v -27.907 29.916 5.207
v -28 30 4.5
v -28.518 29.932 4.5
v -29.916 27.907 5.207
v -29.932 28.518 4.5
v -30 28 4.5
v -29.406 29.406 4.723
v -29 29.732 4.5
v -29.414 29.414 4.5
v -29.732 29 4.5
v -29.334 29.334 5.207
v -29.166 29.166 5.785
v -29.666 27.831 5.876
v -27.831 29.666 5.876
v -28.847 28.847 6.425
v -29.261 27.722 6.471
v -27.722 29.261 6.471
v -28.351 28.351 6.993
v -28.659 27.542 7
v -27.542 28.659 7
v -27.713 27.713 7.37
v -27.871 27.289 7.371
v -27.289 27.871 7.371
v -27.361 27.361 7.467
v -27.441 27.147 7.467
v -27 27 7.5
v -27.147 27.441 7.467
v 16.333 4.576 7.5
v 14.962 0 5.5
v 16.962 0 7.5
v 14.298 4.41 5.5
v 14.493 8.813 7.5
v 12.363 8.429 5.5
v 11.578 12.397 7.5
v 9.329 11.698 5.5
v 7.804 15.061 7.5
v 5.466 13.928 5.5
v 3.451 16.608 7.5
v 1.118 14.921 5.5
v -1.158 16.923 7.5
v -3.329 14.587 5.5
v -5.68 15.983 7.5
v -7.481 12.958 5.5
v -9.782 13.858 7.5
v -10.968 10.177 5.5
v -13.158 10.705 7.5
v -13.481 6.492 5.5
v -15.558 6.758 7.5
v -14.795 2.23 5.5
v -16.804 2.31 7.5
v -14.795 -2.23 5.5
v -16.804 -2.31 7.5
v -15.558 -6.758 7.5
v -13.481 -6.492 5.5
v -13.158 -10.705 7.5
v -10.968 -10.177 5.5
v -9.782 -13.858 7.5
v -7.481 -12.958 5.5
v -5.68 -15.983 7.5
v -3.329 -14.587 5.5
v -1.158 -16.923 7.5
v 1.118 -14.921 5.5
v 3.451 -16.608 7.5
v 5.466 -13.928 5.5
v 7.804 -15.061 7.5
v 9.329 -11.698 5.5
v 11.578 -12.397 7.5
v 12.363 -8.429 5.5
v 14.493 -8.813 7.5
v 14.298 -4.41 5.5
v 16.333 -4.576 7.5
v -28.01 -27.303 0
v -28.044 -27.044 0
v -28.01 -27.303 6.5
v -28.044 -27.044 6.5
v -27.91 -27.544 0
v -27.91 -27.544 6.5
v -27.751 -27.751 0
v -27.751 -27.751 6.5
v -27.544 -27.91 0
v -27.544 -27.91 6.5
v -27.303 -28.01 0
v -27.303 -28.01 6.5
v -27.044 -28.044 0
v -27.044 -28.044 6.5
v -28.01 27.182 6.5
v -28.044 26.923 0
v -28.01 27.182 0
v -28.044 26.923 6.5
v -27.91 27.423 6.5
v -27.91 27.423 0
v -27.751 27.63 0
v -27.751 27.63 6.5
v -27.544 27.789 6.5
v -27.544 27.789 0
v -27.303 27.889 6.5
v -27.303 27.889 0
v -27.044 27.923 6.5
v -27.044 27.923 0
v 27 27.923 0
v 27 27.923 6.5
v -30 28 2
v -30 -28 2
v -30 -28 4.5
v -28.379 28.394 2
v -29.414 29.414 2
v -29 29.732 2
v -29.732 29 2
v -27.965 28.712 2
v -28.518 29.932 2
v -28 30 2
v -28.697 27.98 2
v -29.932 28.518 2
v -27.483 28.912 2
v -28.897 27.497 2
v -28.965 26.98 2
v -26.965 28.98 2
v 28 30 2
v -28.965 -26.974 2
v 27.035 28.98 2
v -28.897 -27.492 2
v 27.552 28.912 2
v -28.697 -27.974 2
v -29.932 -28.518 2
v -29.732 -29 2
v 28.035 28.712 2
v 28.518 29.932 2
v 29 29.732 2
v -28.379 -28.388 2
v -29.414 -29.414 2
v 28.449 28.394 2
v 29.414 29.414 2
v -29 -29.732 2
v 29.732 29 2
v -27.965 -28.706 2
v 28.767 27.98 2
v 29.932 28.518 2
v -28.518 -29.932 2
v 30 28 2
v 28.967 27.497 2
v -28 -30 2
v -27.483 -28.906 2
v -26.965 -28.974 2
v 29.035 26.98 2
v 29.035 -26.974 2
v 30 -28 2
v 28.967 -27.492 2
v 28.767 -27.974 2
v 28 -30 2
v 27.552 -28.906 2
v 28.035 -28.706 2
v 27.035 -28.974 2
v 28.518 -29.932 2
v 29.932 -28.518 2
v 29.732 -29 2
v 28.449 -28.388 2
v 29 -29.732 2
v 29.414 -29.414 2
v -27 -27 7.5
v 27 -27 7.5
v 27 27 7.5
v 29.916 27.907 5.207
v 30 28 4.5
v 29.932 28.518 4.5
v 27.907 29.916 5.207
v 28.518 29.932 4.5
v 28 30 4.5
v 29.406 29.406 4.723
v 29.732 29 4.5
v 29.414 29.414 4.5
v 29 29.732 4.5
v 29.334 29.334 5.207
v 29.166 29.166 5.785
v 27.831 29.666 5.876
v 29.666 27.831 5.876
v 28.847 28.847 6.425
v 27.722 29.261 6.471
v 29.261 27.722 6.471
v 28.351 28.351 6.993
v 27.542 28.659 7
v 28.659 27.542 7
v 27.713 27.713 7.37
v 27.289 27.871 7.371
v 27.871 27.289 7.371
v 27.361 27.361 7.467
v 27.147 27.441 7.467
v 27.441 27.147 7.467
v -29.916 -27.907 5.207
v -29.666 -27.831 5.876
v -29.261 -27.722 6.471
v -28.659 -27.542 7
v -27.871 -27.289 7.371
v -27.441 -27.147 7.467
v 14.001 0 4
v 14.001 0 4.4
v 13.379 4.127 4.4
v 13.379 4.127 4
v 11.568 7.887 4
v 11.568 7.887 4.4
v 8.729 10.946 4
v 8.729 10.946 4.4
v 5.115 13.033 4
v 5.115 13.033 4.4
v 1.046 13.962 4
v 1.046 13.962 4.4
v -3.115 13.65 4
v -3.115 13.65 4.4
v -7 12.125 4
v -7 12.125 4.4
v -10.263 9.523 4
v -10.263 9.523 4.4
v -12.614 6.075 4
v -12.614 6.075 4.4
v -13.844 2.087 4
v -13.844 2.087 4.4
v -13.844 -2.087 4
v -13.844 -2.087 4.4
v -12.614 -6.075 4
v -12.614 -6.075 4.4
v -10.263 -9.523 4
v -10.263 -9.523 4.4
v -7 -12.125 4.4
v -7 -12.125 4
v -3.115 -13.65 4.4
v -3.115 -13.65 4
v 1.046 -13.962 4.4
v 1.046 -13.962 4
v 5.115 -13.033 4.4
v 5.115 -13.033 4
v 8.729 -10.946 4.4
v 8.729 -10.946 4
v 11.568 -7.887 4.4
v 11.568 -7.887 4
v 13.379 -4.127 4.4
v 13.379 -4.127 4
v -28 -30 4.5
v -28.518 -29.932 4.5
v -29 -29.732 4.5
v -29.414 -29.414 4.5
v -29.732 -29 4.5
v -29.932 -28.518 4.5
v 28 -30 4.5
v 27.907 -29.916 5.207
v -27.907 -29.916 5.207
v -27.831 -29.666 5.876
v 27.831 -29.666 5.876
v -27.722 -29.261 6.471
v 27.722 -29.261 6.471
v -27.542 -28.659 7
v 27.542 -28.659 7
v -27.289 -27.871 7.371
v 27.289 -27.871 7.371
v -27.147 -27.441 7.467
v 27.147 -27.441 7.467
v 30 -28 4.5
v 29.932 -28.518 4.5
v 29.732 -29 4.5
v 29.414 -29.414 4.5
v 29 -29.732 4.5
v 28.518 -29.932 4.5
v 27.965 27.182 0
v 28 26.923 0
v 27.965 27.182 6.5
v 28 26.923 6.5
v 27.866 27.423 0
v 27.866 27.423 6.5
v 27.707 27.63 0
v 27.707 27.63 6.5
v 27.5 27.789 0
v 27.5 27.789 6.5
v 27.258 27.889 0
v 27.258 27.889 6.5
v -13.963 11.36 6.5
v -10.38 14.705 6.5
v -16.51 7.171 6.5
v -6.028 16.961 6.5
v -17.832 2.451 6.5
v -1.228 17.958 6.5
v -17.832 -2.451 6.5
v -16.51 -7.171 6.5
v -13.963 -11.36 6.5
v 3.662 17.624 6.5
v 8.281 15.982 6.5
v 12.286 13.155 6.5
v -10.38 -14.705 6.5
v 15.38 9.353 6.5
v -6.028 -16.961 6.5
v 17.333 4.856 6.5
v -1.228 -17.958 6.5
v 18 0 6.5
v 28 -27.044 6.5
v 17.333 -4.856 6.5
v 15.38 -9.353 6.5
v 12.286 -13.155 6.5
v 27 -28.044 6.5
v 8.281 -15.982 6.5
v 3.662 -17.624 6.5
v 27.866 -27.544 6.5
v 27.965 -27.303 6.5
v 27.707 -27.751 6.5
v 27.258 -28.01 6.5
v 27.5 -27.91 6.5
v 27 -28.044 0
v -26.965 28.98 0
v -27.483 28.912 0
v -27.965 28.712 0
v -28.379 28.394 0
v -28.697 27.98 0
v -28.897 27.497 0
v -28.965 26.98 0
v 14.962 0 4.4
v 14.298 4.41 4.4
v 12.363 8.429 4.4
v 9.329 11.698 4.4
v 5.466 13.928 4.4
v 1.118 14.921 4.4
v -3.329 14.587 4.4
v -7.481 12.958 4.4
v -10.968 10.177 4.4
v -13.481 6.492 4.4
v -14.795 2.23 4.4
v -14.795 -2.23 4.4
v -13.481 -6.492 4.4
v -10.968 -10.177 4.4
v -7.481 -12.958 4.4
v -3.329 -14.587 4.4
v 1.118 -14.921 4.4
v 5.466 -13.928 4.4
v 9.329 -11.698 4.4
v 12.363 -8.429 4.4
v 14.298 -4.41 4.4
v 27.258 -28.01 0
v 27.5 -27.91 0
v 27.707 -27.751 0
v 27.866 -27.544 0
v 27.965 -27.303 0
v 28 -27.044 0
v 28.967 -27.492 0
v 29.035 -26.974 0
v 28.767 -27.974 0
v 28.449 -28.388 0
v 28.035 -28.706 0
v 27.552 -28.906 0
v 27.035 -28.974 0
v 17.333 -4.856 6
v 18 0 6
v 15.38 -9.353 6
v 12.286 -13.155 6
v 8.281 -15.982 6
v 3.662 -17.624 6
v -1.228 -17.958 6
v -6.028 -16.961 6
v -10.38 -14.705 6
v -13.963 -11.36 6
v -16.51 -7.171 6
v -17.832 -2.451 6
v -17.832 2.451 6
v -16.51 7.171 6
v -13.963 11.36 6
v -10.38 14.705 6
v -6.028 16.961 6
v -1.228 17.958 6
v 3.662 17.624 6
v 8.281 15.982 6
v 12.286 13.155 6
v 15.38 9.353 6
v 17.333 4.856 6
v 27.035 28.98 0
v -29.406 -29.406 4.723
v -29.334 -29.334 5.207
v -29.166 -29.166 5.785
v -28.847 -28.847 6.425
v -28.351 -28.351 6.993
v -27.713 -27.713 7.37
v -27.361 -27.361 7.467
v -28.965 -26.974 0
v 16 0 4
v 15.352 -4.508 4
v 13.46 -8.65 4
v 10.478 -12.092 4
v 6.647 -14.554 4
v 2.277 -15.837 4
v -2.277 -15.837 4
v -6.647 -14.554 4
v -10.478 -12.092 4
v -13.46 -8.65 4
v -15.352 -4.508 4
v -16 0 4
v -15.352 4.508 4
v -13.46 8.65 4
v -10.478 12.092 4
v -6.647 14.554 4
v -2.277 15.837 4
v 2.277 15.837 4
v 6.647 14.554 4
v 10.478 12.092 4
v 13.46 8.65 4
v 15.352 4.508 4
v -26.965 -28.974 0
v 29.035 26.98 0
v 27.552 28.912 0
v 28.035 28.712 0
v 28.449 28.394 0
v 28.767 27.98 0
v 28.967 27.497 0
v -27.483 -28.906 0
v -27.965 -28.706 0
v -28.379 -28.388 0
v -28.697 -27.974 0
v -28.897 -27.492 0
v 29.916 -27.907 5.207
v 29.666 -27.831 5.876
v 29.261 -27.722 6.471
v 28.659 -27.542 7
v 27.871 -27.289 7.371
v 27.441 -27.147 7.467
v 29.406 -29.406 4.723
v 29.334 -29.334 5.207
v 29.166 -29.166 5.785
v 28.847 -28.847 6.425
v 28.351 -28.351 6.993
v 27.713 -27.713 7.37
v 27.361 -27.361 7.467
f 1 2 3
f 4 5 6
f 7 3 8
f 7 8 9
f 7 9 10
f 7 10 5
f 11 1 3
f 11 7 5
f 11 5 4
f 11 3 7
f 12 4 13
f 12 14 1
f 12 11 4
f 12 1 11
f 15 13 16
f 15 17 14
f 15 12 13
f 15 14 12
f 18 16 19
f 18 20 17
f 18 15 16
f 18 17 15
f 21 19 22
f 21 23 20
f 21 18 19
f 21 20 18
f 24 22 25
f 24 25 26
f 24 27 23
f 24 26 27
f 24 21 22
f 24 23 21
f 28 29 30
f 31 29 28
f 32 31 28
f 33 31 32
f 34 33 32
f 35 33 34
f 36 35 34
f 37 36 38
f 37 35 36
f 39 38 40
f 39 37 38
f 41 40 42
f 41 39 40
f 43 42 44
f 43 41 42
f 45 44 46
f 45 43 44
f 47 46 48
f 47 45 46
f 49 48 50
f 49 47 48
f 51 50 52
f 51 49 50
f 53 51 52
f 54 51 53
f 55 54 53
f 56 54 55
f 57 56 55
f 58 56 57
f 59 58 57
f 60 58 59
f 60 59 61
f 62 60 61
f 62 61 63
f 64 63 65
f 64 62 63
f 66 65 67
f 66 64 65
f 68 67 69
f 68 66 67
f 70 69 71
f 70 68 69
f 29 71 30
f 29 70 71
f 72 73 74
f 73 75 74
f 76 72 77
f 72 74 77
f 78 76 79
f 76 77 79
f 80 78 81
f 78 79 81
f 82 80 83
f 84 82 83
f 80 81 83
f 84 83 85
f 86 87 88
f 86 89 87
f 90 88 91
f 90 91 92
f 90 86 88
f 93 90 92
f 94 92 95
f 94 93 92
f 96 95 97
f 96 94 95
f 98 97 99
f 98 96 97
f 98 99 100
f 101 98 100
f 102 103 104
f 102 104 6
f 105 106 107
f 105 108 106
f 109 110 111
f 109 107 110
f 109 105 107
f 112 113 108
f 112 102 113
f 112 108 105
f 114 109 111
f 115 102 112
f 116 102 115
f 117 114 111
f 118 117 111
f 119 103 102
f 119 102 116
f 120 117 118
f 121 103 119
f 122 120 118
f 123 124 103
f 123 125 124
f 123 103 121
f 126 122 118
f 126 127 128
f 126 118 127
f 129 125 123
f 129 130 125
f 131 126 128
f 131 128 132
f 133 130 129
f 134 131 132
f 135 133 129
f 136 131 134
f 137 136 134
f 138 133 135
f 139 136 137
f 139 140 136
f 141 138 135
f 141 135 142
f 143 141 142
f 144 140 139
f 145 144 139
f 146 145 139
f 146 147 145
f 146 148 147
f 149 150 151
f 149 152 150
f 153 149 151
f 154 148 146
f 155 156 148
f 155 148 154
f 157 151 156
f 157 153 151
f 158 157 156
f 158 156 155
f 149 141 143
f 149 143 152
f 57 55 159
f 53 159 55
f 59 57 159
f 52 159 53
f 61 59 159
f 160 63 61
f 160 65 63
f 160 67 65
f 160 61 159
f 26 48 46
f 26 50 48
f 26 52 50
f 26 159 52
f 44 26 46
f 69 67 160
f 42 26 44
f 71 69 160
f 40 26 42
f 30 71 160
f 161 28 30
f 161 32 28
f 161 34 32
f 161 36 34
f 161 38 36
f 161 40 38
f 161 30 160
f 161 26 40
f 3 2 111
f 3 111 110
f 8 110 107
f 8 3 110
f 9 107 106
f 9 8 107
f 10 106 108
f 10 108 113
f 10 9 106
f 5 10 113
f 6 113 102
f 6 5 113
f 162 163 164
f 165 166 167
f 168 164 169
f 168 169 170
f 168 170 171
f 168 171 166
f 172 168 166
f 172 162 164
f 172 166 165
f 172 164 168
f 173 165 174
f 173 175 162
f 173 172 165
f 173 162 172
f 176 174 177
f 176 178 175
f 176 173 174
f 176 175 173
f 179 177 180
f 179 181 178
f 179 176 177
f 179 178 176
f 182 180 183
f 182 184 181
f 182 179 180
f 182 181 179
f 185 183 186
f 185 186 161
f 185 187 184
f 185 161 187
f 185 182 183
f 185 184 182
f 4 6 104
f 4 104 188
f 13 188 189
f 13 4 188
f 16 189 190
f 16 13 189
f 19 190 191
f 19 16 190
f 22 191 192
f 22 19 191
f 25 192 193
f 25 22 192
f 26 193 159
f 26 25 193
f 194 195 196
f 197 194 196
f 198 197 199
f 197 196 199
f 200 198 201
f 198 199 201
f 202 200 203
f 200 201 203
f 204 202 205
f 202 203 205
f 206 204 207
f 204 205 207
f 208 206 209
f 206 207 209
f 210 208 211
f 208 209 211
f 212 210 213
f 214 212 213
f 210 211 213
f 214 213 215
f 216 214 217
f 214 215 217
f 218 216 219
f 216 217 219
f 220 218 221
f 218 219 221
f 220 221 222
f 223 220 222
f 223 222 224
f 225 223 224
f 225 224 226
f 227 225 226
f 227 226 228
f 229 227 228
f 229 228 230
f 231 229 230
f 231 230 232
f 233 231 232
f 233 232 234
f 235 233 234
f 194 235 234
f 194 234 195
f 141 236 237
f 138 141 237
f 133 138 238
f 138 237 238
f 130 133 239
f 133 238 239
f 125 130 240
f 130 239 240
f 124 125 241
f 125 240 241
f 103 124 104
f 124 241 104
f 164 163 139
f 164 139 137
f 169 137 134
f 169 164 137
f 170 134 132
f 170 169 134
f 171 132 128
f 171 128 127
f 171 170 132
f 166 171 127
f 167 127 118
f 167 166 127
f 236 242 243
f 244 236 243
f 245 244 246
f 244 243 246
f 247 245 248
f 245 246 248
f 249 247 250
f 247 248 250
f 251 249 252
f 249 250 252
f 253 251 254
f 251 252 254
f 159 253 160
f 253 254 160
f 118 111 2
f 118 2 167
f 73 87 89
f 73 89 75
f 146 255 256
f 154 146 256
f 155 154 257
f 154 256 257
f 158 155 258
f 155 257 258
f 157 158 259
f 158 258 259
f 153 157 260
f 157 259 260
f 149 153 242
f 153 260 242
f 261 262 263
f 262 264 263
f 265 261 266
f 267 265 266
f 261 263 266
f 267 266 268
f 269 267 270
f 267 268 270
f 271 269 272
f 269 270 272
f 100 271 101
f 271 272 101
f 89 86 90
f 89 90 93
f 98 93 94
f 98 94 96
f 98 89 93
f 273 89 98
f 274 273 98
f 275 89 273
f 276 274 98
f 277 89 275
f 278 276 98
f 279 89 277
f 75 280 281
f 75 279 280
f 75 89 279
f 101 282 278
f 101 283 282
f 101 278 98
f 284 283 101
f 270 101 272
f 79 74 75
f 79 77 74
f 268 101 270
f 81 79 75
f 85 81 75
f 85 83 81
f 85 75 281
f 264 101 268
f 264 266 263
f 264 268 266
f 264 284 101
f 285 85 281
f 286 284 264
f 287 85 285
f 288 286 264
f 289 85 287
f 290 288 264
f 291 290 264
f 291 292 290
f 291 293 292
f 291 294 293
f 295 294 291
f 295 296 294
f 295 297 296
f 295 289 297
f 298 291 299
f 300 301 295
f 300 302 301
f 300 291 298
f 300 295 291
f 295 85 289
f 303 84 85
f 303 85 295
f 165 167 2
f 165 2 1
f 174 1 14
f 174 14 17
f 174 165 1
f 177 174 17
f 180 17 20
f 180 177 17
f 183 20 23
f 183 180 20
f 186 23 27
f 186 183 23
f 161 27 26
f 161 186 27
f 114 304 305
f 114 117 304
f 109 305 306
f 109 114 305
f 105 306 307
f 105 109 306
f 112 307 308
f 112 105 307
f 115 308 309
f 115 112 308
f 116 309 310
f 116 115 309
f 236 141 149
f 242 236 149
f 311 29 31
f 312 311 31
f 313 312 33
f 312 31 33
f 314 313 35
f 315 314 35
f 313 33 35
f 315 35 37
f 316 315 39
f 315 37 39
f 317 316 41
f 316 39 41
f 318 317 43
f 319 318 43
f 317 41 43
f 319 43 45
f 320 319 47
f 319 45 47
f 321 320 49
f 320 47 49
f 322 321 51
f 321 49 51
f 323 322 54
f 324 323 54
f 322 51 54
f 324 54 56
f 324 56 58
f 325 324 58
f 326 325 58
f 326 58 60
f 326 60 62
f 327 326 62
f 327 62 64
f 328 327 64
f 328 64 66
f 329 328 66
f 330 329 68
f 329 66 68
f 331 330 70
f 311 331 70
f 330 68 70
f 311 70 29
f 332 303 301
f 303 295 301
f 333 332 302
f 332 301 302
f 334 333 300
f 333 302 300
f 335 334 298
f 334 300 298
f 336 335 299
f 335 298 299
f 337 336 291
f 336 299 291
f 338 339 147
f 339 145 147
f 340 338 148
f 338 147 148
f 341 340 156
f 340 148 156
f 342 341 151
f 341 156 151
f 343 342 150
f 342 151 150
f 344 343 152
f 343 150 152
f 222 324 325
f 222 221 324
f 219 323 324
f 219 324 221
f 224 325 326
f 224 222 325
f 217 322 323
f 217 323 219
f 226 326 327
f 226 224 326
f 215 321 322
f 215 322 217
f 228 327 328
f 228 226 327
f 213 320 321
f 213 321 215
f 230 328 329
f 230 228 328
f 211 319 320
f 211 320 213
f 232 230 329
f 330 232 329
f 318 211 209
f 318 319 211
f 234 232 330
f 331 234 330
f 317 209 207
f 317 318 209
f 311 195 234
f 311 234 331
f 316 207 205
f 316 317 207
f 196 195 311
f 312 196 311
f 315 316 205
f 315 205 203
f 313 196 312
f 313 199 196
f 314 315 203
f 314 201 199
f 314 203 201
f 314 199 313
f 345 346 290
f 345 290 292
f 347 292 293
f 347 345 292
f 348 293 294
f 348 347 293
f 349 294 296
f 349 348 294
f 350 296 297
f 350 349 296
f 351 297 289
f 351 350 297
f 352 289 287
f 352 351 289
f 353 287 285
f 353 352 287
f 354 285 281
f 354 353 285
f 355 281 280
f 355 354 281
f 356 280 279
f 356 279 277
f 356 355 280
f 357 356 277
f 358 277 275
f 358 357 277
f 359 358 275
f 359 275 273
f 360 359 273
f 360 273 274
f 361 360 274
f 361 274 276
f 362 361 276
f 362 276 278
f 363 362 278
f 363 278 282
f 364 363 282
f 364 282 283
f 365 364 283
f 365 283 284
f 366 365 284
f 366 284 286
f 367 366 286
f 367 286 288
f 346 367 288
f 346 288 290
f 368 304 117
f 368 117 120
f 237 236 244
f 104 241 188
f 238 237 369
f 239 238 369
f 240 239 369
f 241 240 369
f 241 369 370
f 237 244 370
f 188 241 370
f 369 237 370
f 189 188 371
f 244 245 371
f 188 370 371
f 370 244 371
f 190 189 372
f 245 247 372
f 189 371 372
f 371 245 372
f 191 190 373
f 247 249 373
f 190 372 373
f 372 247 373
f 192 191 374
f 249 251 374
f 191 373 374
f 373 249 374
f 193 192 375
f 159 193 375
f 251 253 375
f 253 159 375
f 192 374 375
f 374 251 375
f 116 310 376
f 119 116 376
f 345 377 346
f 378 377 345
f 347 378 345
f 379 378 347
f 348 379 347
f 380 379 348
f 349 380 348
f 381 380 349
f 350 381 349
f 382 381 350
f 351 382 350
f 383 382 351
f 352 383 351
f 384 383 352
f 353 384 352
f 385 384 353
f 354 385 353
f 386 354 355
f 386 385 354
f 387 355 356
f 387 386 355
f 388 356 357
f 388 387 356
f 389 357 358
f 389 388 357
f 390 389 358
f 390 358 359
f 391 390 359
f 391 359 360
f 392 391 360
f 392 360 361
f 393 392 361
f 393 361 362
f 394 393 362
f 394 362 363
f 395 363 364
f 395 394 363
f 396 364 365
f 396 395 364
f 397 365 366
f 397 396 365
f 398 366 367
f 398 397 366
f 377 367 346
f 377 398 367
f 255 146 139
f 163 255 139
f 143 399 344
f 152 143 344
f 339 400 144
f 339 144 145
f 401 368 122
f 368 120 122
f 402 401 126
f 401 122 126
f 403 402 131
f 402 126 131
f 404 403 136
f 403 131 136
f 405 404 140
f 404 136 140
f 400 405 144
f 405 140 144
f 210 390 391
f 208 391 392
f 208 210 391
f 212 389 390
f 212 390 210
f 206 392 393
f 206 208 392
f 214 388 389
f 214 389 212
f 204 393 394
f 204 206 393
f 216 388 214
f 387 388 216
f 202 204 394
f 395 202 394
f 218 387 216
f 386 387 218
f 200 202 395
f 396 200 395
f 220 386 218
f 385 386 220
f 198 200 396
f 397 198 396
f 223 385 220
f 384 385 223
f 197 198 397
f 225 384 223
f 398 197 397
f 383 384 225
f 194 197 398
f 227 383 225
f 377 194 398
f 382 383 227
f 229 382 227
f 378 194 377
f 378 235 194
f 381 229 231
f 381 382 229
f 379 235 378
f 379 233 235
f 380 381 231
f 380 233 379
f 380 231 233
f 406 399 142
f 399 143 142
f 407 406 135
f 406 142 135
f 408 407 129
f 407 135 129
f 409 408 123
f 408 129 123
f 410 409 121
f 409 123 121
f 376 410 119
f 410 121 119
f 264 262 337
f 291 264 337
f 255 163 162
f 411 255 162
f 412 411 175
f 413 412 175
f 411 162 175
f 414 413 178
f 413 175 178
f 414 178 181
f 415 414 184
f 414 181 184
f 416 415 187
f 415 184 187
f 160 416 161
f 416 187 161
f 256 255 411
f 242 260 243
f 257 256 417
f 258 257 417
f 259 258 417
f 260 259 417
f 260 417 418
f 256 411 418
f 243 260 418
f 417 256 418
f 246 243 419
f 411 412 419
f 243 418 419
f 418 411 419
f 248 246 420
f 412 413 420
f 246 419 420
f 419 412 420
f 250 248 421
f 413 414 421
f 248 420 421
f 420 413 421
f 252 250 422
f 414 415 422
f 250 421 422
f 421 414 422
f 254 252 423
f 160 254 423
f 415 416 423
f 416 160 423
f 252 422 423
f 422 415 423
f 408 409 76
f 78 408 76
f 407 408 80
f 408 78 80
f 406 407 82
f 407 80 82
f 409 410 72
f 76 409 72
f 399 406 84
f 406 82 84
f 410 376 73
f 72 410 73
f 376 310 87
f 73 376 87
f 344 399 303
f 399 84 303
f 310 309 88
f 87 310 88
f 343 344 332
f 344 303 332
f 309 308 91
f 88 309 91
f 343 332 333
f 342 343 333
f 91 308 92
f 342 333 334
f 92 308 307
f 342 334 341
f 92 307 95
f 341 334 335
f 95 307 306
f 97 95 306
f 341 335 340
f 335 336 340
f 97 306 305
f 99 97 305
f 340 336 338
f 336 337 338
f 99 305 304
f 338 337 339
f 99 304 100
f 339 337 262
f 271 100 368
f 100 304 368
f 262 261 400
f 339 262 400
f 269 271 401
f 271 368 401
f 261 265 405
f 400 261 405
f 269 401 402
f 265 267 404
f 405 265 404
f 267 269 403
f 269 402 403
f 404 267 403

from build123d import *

# Parameters (mm, degrees)
SKETCH_W        = 60
SKETCH_H        = 60
PAD_DEPTH       = 7.5
FILLET_R        = 3
SKETCH001_R     = 14.962444
POCKET_DEPTH    = 3.1
CHAMFER_SIZE    = 2
SKETCH002_R     = 14.000834
POCKET001_DEPTH = 2
FILLET001_R     = 2
SKETCH003_W     = 56.043682
SKETCH003_H     = 55.967268
SKETCH003_R     = 18
POCKET002_DEPTH = 6.5
FILLET002_R     = 1
SKETCH004_R     = 18
POCKET003_DEPTH = 4
CHAMFER001_SIZE = 2
SKETCH005_W     = 60
SKETCH005_H     = 60
SKETCH005_W_2   = 58
SKETCH005_H_2   = 57.953869
POCKET004_DEPTH = 2
FILLET003_R     = 2


with BuildPart() as part:
    # Sketch → Pad (new body)
    with BuildSketch(Plane.XY):
        Rectangle(SKETCH_W, SKETCH_H)
    extrude(amount=PAD_DEPTH)

    # Fillet
    fillet_edges = [part.edges().sort_by_distance(p)[0] for p in [
        (30, 0, 7.5),
        (0, 30, 7.5),
        (-30, 0, 7.5),
        (0, -30, 7.5),
    ]]
    fillet(fillet_edges, radius=FILLET_R)

    # Sketch001 → Pocket (cut)
    with BuildSketch(Plane.XY.offset(7.5)):
        Circle(SKETCH001_R)
    extrude(amount=-POCKET_DEPTH, mode=Mode.SUBTRACT)

    # Chamfer
    chamfer_edges = [part.edges().sort_by_distance(p)[0] for p in [
        (-14.962444, 0, 7.5),
    ]]
    chamfer(chamfer_edges, length=CHAMFER_SIZE)

    # Sketch002 → Pocket001 (cut)
    with BuildSketch(Plane.XY.offset(4.4)):
        Circle(SKETCH002_R)
    extrude(amount=-POCKET001_DEPTH, mode=Mode.SUBTRACT)

    # Fillet001
    fillet001_edges = [part.edges().sort_by_distance(p)[0] for p in [
        (-30, -30, 2.25),
        (30, -30, 2.25),
        (30, 30, 2.25),
        (-30, 30, 2.25),
    ]]
    fillet(fillet001_edges, radius=FILLET001_R)

    # Sketch003 → Pocket002 (cut)
    with BuildSketch(Plane(origin=(0, 0, 0), x_dir=(1, 0, 0), z_dir=(0, 0, -1))):
        with Locations((-0.022306, 0.060517)):
            Rectangle(SKETCH003_W, SKETCH003_H)
        Circle(SKETCH003_R, mode=Mode.SUBTRACT)
    extrude(amount=-POCKET002_DEPTH, mode=Mode.SUBTRACT)

    # Fillet002
    fillet002_edges = [part.edges().sort_by_distance(p)[0] for p in [
        (27.999535, 27.923117, 3.25),
        (-28.044147, 27.923117, 3.25),
        (-28.044147, -28.044151, 3.25),
        (27.999535, -28.044151, 3.25),
    ]]
    fillet(fillet002_edges, radius=FILLET002_R)

    # Sketch004 → Pocket003 (cut)
    with BuildSketch(Plane(origin=(0, 0, 0), x_dir=(1, 0, 0), z_dir=(0, 0, -1))):
        Circle(SKETCH004_R)
    extrude(amount=-POCKET003_DEPTH, mode=Mode.SUBTRACT)

    # Chamfer001
    chamfer001_edges = [part.edges().sort_by_distance(p)[0] for p in [
        (-18, 0, 4),
    ]]
    chamfer(chamfer001_edges, length=CHAMFER001_SIZE)

    # Sketch005 → Pocket004 (cut)
    with BuildSketch(Plane(origin=(0, 0, 0), x_dir=(1, 0, 0), z_dir=(0, 0, -1))):
        Rectangle(SKETCH005_W, SKETCH005_H)
        with Locations((0.034769, -0.002889)):
            Rectangle(SKETCH005_W_2, SKETCH005_H_2, mode=Mode.SUBTRACT)
    extrude(amount=-POCKET004_DEPTH, mode=Mode.SUBTRACT)

    # Fillet003
    fillet003_edges = [part.edges().sort_by_distance(p)[0] for p in [
        (-28.965231, 28.979824, 1),
        (-28.965231, -28.974045, 1),
        (29.034769, -28.974045, 1),
        (29.034769, 28.979824, 1),
    ]]
    fillet(fillet003_edges, radius=FILLET003_R)


solid = part.part
